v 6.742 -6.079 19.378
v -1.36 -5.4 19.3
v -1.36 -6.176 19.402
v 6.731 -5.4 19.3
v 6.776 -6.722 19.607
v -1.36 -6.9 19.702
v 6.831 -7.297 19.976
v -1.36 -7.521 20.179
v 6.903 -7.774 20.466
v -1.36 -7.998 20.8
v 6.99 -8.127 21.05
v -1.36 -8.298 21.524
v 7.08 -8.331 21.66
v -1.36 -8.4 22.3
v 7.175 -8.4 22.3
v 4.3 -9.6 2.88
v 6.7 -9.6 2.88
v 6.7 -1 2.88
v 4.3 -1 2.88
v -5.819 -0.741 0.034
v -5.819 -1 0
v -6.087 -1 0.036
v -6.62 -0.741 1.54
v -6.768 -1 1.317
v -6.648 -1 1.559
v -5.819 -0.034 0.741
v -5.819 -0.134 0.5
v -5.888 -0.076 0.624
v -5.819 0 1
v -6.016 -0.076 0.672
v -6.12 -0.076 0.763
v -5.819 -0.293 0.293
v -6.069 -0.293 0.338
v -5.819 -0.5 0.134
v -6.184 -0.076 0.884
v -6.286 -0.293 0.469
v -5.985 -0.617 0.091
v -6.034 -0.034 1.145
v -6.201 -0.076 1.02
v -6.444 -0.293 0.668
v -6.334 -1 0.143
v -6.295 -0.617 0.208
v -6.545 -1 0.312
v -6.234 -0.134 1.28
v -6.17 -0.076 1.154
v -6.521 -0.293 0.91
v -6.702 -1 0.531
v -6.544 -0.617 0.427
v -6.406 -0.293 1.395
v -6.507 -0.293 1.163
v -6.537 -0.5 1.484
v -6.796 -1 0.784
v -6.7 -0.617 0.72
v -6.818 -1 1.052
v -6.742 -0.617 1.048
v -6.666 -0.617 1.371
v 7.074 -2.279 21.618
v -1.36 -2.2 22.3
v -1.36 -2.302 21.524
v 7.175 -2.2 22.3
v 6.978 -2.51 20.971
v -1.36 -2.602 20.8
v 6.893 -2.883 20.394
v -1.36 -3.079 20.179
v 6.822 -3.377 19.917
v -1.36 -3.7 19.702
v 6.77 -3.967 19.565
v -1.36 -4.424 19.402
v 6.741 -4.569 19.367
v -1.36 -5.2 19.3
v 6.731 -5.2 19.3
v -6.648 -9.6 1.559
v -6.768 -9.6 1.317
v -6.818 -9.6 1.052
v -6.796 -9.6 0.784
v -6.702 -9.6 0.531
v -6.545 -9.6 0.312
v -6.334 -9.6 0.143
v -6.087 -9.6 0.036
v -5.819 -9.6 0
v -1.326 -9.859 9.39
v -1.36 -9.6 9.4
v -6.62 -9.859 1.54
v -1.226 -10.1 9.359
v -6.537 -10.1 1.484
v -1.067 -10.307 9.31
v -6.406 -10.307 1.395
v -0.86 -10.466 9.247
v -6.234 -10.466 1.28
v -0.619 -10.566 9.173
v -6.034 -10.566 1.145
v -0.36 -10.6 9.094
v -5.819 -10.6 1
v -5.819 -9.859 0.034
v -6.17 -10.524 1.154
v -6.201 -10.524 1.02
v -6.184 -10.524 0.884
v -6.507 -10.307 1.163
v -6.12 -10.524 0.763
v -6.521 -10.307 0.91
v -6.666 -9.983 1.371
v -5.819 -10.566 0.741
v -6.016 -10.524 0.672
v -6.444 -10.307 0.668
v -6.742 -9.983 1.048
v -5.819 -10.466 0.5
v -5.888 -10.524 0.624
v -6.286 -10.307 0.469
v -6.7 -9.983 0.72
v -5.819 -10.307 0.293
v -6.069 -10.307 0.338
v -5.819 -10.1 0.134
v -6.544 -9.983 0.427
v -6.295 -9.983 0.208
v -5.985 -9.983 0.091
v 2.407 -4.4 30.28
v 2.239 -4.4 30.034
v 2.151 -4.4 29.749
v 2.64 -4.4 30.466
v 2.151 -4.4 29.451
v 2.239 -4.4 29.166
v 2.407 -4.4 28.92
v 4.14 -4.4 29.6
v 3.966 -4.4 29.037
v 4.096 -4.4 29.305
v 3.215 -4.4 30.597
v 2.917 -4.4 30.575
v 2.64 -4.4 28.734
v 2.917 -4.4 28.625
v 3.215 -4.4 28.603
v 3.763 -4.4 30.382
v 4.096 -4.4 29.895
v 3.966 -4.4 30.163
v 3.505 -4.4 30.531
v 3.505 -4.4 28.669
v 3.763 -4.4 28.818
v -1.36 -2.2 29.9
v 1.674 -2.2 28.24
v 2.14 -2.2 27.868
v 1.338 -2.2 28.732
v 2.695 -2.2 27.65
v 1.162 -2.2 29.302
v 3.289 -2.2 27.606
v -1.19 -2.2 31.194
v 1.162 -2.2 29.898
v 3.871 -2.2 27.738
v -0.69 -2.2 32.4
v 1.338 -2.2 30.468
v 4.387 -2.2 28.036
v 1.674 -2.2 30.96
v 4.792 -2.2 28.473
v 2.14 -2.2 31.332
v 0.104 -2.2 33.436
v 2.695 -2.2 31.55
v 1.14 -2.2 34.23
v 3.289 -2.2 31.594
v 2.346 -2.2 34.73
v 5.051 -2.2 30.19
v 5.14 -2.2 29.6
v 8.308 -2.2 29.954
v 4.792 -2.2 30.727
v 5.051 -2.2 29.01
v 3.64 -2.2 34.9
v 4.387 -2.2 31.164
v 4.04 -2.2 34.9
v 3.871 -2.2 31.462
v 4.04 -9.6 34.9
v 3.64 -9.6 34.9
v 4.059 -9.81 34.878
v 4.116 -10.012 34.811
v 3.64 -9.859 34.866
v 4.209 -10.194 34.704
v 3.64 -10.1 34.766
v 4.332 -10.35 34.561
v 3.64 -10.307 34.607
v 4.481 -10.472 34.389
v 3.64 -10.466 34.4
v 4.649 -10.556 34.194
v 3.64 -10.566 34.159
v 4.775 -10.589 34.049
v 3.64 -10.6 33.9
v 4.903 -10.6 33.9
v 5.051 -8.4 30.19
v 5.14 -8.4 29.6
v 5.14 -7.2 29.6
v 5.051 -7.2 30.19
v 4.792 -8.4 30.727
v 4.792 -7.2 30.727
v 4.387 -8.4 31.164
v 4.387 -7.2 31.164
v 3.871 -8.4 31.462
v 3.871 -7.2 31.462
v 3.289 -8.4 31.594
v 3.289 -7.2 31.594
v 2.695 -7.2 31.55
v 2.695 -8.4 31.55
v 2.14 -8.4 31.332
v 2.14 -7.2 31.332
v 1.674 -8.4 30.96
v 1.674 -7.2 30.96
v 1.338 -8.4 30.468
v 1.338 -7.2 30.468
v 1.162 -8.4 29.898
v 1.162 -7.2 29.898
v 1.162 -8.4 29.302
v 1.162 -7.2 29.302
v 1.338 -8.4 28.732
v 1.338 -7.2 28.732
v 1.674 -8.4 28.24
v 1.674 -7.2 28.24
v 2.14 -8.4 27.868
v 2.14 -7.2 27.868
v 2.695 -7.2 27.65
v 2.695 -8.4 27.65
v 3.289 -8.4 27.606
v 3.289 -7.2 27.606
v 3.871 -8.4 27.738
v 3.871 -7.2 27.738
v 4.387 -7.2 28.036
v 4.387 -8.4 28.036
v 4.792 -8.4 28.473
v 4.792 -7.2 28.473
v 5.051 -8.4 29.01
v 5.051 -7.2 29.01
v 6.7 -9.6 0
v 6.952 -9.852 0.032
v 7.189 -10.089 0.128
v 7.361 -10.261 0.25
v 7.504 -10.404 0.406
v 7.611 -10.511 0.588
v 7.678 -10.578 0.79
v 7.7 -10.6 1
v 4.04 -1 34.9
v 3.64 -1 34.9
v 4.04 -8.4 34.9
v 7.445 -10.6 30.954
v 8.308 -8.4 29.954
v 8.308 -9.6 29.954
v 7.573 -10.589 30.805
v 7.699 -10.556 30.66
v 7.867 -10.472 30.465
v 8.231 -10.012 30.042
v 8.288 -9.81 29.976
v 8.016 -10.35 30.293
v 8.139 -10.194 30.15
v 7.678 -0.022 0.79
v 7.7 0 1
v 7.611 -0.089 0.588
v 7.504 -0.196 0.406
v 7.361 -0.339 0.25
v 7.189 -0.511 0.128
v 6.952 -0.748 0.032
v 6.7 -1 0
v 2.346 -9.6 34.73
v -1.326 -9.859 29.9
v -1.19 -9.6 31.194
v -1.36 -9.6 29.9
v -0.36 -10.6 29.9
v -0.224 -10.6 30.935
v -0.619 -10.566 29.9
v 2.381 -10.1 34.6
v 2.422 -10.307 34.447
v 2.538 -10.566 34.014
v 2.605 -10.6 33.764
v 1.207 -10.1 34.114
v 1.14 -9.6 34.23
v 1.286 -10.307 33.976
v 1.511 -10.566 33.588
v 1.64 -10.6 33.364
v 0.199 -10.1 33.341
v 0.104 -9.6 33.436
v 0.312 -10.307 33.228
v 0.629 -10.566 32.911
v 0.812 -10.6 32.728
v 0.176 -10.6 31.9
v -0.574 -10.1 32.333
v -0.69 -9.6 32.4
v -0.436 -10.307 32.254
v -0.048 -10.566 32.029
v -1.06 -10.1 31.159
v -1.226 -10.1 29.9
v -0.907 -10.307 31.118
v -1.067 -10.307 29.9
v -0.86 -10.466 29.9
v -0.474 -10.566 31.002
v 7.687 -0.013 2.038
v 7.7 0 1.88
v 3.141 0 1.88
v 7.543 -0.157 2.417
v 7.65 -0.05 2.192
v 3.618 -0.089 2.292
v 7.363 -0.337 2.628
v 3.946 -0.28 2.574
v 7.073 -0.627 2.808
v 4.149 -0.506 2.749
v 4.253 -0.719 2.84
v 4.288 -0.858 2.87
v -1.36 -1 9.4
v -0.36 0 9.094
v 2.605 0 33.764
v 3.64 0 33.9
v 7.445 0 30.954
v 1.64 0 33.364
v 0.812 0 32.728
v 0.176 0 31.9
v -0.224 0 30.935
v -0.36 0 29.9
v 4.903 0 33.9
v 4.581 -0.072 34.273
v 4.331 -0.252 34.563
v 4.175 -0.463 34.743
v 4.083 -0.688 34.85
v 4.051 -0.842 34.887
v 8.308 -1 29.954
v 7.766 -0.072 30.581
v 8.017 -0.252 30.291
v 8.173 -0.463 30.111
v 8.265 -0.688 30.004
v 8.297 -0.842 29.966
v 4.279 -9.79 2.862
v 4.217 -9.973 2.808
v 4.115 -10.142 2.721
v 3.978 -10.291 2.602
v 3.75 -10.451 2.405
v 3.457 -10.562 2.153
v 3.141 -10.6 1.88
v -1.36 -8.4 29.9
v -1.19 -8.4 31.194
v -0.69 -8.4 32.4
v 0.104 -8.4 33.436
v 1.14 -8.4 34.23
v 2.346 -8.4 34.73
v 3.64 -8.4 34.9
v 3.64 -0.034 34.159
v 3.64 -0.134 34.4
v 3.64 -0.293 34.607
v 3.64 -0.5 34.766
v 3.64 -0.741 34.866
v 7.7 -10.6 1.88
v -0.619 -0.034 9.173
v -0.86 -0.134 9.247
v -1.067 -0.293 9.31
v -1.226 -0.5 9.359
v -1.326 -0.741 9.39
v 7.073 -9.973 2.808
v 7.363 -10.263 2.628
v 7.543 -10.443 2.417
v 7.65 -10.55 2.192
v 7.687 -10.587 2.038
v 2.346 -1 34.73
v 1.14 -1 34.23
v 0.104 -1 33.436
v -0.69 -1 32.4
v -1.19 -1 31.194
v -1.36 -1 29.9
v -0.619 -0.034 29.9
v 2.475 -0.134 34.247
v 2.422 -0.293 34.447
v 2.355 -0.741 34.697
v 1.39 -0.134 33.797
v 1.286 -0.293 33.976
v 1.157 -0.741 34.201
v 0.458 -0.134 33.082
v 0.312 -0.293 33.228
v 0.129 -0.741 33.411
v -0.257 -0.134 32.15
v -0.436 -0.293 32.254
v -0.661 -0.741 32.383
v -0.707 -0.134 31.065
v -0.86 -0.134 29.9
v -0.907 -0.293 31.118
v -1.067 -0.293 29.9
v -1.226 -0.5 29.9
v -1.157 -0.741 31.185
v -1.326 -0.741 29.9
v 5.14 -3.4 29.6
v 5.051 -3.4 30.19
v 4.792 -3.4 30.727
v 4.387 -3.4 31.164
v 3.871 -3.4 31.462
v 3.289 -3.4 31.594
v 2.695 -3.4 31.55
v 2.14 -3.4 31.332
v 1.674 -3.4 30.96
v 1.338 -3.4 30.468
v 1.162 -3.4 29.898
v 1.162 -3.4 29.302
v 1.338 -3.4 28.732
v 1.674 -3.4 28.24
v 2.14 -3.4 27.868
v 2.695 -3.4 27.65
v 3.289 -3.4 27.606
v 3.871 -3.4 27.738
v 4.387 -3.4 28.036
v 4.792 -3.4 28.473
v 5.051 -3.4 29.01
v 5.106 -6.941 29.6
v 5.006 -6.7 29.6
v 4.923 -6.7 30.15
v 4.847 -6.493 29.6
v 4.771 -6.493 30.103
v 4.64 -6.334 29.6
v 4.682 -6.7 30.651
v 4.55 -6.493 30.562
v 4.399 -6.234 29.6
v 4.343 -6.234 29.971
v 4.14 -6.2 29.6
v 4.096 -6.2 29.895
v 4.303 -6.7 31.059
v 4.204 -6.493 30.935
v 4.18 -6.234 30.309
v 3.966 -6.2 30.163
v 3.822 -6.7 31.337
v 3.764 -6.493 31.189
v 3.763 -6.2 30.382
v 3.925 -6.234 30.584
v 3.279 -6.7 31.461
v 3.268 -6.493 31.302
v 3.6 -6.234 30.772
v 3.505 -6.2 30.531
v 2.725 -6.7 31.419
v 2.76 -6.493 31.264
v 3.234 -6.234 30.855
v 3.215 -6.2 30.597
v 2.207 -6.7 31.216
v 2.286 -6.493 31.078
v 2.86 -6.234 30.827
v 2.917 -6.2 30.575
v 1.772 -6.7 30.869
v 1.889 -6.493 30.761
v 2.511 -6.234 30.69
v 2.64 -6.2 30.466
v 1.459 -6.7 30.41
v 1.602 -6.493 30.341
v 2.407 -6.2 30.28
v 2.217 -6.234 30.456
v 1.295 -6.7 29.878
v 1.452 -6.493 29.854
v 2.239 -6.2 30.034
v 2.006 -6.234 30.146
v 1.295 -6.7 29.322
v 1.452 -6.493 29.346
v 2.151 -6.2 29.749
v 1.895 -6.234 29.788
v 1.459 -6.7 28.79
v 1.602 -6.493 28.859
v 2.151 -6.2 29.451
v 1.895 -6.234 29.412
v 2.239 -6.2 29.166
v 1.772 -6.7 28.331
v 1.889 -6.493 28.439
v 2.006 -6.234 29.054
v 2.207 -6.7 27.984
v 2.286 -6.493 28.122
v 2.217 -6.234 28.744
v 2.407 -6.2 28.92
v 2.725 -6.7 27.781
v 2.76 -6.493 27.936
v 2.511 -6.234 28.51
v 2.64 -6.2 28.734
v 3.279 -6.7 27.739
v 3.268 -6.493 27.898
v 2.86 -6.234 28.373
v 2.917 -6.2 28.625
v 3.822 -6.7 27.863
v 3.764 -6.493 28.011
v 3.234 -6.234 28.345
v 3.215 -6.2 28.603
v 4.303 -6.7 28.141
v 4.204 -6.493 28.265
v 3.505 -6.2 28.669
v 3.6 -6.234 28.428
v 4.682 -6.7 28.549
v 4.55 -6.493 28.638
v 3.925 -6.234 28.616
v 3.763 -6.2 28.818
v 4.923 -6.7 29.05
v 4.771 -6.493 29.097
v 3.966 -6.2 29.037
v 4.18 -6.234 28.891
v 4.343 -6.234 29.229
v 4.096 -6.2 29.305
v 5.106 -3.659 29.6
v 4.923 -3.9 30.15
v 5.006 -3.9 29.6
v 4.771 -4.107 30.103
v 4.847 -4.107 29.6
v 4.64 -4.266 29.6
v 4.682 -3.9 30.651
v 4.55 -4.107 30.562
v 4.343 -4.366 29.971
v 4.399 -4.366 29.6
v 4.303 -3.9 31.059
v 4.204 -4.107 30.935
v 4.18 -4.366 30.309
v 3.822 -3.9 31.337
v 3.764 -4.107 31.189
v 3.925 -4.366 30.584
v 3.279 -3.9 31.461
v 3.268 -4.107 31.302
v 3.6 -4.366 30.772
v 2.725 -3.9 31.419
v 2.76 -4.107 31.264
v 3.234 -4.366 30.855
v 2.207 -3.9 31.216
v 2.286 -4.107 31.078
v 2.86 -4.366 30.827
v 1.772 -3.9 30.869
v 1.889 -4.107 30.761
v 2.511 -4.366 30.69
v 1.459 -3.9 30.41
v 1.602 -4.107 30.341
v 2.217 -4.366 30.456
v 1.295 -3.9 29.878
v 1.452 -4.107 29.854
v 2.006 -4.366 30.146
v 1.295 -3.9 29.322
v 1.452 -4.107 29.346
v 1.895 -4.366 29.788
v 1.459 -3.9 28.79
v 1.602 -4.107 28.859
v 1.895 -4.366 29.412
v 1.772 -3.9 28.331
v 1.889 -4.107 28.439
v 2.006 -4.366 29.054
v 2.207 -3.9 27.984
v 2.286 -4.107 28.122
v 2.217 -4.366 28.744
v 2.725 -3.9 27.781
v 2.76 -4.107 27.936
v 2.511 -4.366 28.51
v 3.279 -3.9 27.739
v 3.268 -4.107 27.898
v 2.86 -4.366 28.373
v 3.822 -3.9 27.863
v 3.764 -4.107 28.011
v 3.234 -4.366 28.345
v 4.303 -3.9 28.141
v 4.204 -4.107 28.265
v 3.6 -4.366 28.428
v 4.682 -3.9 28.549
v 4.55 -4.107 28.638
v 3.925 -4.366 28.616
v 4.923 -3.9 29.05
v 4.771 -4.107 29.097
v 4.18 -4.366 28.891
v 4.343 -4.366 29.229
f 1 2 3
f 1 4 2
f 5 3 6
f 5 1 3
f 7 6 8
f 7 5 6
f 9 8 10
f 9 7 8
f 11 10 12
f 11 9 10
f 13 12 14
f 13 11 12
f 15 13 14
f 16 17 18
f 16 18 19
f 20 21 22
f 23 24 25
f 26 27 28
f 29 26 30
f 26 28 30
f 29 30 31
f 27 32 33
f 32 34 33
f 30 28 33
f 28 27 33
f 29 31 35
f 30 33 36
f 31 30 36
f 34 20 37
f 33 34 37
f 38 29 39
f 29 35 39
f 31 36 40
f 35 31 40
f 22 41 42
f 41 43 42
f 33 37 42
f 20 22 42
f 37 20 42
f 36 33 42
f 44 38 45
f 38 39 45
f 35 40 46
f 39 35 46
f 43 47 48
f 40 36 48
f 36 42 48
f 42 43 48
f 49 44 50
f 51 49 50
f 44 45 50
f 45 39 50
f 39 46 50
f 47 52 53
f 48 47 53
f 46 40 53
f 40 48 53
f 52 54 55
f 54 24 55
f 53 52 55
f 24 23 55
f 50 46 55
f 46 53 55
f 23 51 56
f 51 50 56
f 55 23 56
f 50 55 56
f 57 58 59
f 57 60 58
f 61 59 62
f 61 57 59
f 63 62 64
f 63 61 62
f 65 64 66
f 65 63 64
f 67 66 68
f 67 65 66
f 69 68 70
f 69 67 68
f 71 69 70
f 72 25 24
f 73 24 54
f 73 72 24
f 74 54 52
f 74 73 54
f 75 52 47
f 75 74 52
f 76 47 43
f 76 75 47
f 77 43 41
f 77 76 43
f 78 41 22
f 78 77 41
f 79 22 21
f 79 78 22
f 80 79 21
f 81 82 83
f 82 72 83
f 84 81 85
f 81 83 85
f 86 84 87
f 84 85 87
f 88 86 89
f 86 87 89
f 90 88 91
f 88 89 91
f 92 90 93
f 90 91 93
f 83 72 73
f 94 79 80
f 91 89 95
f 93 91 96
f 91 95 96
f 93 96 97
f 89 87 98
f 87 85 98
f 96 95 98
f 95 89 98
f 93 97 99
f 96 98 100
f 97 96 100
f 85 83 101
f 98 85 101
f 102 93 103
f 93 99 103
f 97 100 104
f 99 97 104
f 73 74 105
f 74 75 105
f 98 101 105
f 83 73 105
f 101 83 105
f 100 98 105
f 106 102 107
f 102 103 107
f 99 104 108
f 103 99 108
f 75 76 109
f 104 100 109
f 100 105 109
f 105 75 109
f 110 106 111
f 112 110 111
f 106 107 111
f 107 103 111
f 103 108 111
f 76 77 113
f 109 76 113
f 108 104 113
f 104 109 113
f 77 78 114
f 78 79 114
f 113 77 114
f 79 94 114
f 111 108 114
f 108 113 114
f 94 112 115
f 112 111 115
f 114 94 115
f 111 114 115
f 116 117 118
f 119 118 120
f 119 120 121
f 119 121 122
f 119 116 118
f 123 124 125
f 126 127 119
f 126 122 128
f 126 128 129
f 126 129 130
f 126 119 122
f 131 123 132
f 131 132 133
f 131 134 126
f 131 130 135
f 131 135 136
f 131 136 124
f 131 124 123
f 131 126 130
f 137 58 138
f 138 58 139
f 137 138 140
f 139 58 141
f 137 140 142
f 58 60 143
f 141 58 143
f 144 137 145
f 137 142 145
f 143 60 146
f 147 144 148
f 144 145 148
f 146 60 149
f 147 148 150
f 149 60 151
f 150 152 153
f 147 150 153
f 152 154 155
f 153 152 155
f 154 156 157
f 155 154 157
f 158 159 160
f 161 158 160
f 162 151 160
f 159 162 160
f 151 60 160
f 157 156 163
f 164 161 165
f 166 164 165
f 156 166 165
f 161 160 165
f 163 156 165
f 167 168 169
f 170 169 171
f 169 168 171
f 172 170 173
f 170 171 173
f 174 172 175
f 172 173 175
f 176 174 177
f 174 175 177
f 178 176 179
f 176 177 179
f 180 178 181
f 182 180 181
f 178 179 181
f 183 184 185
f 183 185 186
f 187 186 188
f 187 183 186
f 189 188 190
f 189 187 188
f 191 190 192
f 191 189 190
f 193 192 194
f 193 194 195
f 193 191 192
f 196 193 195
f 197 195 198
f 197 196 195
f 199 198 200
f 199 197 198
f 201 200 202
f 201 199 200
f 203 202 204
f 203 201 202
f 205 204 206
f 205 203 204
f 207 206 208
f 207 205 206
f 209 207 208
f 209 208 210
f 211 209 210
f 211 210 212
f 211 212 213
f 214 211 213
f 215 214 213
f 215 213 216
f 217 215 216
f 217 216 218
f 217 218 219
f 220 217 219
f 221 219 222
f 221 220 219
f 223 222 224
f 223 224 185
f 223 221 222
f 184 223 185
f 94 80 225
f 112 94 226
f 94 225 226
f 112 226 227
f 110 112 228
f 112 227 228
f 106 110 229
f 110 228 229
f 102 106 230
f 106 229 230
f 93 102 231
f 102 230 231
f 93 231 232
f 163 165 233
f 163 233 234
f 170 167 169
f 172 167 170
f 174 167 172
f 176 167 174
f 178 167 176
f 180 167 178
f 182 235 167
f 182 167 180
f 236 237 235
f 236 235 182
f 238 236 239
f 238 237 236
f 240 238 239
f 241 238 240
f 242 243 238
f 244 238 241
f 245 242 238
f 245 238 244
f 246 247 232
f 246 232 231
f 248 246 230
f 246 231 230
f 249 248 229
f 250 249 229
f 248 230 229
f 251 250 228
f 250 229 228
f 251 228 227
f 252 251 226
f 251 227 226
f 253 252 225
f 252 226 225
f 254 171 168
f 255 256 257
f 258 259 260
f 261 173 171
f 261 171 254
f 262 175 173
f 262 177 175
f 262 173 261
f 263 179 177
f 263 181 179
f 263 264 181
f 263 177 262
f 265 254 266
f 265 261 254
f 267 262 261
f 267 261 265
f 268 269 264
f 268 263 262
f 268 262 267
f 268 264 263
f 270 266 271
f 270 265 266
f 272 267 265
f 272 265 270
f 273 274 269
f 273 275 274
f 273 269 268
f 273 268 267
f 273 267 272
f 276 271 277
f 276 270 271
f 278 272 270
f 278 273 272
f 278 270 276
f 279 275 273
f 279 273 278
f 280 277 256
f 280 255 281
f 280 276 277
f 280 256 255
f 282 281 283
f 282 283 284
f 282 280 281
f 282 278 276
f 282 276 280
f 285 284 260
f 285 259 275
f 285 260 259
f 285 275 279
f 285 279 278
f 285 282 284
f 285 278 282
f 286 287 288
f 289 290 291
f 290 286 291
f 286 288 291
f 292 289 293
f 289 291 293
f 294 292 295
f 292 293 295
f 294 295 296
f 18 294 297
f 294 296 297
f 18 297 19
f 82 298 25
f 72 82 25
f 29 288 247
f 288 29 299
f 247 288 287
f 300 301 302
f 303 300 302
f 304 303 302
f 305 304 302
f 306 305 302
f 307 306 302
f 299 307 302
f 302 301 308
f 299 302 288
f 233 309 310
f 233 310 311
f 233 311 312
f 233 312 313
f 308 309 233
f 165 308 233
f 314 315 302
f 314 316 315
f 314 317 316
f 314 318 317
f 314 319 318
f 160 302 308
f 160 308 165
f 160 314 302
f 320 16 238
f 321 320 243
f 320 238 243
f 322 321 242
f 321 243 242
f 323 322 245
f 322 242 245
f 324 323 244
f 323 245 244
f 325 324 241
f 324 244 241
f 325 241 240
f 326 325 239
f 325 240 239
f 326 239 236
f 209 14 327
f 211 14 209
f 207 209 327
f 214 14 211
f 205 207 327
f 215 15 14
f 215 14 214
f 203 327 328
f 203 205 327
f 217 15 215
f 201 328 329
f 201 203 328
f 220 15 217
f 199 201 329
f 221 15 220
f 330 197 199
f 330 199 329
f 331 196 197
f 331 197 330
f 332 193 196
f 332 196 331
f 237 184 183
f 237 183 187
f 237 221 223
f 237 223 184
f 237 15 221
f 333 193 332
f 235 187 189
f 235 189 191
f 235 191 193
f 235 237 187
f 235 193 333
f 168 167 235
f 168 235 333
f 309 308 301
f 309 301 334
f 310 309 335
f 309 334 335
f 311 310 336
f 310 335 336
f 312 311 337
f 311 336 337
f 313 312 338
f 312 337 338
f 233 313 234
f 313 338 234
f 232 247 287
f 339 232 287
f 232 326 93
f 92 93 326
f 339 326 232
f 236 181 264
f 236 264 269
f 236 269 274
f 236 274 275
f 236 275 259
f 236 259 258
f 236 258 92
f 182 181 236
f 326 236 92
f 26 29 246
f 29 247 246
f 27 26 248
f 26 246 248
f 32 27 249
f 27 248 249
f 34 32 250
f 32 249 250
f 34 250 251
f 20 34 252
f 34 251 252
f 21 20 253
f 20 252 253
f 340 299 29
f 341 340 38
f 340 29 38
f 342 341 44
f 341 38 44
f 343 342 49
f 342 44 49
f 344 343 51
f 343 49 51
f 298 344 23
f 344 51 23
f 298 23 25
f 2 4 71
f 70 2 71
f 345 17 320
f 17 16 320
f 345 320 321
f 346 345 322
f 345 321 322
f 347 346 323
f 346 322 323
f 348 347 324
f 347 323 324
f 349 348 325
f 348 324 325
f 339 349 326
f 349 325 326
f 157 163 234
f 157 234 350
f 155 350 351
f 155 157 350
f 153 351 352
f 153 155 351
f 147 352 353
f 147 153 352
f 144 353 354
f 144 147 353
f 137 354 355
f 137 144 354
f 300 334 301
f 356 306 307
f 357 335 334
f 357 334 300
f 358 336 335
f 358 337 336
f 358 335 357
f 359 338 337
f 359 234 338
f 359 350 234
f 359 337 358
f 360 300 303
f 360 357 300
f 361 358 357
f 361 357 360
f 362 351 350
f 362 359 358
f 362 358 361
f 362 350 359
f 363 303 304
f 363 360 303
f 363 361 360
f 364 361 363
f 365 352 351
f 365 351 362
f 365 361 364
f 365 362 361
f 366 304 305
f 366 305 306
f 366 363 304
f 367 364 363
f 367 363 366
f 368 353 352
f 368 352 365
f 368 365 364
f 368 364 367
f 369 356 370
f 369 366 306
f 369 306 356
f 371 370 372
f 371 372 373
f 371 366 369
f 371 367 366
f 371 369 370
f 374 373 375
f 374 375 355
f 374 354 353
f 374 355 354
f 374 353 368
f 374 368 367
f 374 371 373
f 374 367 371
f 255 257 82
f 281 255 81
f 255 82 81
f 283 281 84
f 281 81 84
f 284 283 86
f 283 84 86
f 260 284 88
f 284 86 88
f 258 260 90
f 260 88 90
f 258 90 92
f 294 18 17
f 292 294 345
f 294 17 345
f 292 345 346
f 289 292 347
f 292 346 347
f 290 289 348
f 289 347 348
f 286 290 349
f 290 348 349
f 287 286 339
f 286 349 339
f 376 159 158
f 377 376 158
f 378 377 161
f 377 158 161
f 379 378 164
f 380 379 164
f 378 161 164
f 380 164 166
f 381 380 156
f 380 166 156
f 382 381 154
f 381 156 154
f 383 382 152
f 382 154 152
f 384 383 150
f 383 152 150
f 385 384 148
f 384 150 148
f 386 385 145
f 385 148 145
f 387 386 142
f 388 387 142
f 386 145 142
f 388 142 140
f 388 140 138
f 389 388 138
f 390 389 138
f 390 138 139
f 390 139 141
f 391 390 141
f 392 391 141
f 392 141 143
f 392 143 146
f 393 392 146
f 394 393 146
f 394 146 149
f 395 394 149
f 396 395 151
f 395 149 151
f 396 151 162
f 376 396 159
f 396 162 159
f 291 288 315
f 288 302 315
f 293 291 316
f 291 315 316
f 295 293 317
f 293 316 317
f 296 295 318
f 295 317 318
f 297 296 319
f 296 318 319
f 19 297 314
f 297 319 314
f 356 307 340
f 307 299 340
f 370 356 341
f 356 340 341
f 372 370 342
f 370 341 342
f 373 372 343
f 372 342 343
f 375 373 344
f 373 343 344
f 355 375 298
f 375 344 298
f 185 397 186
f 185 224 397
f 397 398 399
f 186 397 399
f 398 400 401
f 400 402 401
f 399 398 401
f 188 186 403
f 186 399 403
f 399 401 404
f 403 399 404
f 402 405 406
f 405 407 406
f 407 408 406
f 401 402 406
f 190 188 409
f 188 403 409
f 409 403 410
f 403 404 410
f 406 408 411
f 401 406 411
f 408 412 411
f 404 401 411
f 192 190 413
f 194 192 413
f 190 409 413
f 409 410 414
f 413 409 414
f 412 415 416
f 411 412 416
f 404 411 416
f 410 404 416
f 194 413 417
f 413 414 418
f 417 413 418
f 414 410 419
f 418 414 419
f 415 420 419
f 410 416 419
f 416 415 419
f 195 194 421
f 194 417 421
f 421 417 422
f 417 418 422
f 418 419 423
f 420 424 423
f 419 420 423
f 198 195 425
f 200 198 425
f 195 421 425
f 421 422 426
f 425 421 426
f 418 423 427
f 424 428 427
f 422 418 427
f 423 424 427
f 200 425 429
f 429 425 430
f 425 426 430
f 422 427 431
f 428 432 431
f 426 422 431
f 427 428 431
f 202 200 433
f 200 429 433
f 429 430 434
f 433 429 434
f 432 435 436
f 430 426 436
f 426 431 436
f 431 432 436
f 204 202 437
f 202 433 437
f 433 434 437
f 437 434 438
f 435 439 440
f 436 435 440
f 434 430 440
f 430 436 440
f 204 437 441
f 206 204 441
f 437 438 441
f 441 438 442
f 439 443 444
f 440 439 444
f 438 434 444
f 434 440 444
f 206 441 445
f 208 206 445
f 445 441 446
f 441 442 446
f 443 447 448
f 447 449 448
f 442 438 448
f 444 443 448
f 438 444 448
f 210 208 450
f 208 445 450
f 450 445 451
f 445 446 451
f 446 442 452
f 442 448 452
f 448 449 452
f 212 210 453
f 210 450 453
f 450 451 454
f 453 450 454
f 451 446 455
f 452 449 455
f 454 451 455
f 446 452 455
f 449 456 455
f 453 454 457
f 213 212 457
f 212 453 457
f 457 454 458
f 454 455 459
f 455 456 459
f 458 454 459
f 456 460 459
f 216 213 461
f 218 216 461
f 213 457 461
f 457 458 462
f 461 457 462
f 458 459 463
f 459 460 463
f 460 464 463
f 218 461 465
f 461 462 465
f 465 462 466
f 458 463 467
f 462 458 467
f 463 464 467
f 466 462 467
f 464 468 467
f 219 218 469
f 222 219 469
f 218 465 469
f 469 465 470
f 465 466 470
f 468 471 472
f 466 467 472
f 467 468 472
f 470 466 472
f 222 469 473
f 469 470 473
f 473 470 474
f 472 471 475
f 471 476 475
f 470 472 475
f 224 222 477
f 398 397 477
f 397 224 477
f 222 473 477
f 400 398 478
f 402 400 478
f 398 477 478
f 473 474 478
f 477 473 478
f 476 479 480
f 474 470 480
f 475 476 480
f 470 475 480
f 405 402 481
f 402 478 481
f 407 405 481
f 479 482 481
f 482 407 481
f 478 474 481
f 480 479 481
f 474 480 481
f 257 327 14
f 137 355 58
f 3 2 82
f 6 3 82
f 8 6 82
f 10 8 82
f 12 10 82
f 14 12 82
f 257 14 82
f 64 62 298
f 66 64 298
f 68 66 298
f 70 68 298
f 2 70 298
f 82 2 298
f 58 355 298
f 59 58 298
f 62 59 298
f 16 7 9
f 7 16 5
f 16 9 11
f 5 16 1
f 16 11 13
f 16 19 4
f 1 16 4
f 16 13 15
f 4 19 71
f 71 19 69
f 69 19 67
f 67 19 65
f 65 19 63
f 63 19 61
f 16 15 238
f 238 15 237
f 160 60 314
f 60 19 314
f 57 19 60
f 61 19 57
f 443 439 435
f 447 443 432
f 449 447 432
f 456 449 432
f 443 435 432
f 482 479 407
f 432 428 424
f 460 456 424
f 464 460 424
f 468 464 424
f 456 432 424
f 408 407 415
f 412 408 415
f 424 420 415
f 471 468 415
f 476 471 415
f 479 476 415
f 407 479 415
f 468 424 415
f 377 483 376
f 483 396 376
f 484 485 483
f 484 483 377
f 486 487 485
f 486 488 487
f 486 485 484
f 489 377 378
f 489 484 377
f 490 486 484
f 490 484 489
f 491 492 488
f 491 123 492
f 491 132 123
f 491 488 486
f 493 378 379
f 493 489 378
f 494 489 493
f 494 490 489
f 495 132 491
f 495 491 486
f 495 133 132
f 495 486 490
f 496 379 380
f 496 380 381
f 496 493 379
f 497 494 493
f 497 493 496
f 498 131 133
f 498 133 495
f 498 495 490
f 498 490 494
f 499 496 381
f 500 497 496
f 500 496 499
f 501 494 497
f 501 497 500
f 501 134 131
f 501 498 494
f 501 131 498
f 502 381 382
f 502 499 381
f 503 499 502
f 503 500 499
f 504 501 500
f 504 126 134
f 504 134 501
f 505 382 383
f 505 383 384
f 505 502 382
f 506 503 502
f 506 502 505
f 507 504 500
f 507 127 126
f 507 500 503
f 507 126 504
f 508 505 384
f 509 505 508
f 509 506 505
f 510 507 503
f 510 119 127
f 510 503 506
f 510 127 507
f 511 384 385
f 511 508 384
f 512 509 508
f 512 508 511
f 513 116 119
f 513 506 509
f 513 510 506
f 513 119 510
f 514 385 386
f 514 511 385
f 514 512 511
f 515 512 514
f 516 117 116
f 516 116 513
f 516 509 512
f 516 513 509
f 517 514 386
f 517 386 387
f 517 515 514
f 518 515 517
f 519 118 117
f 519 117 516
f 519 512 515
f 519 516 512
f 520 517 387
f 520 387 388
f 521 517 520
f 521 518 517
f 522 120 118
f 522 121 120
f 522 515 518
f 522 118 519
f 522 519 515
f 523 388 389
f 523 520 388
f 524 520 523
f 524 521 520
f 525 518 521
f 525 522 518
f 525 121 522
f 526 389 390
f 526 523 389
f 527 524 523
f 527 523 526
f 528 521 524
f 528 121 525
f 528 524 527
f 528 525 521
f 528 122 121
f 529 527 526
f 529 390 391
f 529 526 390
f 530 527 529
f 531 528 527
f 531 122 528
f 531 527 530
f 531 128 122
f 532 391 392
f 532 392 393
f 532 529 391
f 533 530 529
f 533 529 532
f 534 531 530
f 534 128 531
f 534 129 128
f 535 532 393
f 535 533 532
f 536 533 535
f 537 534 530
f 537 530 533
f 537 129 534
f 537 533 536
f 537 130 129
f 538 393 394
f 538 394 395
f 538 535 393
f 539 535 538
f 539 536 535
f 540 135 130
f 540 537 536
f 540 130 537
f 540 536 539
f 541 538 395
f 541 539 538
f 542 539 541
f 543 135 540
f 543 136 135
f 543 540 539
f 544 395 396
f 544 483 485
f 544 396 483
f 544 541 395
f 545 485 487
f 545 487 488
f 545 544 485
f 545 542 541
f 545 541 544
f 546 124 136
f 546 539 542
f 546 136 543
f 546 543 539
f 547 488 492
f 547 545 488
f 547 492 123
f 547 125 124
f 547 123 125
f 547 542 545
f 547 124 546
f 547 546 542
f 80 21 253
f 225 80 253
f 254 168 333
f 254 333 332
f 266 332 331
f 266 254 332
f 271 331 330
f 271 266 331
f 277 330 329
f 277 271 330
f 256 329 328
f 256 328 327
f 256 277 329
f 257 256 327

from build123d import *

# Parameters (mm, degrees)
F1_DEPTH = 10.6
F2_R     = 5
F3_SIZE  = 5
F4_W     = 6.2000000016
F4_H     = 15.6
F5_DEPTH = 12.5
F7_R     = 2
F8_DEPTH = 2.2
F10_R    = 1
F11_R    = 3


with BuildPart() as f1:
    # F0 (on Front) → F1 (new body)
    with BuildSketch(Plane.XZ):
        Polygon((-1.36, 9.4), (-7.7, 0), (7.7, 0), (7.7, 2.88), (4.3, 2.88), (9.04, 34.9), (-1.36, 34.9), align=None)
    extrude(amount=F1_DEPTH)

    # F2
    f2_edges = [f1.edges().sort_by_distance(p)[0] for p in [
        (-1.36, -5.3, 34.9),
    ]]
    fillet(f2_edges, radius=F2_R)

    # F3
    f3_edges = [f1.edges().sort_by_distance(p)[0] for p in [
        (9.04, -5.3, 34.9),
    ]]
    chamfer(f3_edges, length=F3_SIZE)

    # F4 (on Right) → F5 (cut, symmetric)
    with BuildSketch(Plane.YZ):
        with Locations((-5.2999999992, 27.100082695)):
            Rectangle(F4_W, F4_H)
    extrude(amount=F5_DEPTH, both=True, mode=Mode.SUBTRACT)

    # F7 (on face) → F8 (join)
    with BuildSketch(Plane.XZ.offset(2.1999999984)):
        with Locations((3.14, 29.6)):
            Circle(F7_R)
    extrude(amount=F8_DEPTH)

    # F9: F1 across plane


with BuildPart() as f1_1:
    add(f1.part)
    add(f1.part.mirror(Plane.XZ.offset(5.3)))

    # F10
    f10_edges = [f1_1.edges().sort_by_distance(p)[0] for p in [
        (1.14, -6.2, 29.6),
        (1.14, -4.4, 29.6),
        (-4.53, 0, 4.7),
        (-7.7, -5.3, 0),
        (-4.53, -10.6, 4.7),
        (-1.36, -10.6, 19.65),
        (-1.36, 0, 19.65),
        (6.303908, 0, 16.41695),
        (6.303908, -10.6, 16.41695),
        (6, -10.6, 2.88),
        (7.7, -5.3, 2.88),
        (6, 0, 2.88),
        (0, 0, 0),
        (7.7, -5.3, 0),
        (0, -10.6, 0),
    ]]
    fillet(f10_edges, radius=F10_R)

    # F11
    f11_edges = [f1_1.edges().sort_by_distance(p)[0] for p in [
        (2.685353, -2.2, 19.300083),
        (2.685353, -8.4, 19.300083),
    ]]
    fillet(f11_edges, radius=F11_R)


solid = f1_1.part
